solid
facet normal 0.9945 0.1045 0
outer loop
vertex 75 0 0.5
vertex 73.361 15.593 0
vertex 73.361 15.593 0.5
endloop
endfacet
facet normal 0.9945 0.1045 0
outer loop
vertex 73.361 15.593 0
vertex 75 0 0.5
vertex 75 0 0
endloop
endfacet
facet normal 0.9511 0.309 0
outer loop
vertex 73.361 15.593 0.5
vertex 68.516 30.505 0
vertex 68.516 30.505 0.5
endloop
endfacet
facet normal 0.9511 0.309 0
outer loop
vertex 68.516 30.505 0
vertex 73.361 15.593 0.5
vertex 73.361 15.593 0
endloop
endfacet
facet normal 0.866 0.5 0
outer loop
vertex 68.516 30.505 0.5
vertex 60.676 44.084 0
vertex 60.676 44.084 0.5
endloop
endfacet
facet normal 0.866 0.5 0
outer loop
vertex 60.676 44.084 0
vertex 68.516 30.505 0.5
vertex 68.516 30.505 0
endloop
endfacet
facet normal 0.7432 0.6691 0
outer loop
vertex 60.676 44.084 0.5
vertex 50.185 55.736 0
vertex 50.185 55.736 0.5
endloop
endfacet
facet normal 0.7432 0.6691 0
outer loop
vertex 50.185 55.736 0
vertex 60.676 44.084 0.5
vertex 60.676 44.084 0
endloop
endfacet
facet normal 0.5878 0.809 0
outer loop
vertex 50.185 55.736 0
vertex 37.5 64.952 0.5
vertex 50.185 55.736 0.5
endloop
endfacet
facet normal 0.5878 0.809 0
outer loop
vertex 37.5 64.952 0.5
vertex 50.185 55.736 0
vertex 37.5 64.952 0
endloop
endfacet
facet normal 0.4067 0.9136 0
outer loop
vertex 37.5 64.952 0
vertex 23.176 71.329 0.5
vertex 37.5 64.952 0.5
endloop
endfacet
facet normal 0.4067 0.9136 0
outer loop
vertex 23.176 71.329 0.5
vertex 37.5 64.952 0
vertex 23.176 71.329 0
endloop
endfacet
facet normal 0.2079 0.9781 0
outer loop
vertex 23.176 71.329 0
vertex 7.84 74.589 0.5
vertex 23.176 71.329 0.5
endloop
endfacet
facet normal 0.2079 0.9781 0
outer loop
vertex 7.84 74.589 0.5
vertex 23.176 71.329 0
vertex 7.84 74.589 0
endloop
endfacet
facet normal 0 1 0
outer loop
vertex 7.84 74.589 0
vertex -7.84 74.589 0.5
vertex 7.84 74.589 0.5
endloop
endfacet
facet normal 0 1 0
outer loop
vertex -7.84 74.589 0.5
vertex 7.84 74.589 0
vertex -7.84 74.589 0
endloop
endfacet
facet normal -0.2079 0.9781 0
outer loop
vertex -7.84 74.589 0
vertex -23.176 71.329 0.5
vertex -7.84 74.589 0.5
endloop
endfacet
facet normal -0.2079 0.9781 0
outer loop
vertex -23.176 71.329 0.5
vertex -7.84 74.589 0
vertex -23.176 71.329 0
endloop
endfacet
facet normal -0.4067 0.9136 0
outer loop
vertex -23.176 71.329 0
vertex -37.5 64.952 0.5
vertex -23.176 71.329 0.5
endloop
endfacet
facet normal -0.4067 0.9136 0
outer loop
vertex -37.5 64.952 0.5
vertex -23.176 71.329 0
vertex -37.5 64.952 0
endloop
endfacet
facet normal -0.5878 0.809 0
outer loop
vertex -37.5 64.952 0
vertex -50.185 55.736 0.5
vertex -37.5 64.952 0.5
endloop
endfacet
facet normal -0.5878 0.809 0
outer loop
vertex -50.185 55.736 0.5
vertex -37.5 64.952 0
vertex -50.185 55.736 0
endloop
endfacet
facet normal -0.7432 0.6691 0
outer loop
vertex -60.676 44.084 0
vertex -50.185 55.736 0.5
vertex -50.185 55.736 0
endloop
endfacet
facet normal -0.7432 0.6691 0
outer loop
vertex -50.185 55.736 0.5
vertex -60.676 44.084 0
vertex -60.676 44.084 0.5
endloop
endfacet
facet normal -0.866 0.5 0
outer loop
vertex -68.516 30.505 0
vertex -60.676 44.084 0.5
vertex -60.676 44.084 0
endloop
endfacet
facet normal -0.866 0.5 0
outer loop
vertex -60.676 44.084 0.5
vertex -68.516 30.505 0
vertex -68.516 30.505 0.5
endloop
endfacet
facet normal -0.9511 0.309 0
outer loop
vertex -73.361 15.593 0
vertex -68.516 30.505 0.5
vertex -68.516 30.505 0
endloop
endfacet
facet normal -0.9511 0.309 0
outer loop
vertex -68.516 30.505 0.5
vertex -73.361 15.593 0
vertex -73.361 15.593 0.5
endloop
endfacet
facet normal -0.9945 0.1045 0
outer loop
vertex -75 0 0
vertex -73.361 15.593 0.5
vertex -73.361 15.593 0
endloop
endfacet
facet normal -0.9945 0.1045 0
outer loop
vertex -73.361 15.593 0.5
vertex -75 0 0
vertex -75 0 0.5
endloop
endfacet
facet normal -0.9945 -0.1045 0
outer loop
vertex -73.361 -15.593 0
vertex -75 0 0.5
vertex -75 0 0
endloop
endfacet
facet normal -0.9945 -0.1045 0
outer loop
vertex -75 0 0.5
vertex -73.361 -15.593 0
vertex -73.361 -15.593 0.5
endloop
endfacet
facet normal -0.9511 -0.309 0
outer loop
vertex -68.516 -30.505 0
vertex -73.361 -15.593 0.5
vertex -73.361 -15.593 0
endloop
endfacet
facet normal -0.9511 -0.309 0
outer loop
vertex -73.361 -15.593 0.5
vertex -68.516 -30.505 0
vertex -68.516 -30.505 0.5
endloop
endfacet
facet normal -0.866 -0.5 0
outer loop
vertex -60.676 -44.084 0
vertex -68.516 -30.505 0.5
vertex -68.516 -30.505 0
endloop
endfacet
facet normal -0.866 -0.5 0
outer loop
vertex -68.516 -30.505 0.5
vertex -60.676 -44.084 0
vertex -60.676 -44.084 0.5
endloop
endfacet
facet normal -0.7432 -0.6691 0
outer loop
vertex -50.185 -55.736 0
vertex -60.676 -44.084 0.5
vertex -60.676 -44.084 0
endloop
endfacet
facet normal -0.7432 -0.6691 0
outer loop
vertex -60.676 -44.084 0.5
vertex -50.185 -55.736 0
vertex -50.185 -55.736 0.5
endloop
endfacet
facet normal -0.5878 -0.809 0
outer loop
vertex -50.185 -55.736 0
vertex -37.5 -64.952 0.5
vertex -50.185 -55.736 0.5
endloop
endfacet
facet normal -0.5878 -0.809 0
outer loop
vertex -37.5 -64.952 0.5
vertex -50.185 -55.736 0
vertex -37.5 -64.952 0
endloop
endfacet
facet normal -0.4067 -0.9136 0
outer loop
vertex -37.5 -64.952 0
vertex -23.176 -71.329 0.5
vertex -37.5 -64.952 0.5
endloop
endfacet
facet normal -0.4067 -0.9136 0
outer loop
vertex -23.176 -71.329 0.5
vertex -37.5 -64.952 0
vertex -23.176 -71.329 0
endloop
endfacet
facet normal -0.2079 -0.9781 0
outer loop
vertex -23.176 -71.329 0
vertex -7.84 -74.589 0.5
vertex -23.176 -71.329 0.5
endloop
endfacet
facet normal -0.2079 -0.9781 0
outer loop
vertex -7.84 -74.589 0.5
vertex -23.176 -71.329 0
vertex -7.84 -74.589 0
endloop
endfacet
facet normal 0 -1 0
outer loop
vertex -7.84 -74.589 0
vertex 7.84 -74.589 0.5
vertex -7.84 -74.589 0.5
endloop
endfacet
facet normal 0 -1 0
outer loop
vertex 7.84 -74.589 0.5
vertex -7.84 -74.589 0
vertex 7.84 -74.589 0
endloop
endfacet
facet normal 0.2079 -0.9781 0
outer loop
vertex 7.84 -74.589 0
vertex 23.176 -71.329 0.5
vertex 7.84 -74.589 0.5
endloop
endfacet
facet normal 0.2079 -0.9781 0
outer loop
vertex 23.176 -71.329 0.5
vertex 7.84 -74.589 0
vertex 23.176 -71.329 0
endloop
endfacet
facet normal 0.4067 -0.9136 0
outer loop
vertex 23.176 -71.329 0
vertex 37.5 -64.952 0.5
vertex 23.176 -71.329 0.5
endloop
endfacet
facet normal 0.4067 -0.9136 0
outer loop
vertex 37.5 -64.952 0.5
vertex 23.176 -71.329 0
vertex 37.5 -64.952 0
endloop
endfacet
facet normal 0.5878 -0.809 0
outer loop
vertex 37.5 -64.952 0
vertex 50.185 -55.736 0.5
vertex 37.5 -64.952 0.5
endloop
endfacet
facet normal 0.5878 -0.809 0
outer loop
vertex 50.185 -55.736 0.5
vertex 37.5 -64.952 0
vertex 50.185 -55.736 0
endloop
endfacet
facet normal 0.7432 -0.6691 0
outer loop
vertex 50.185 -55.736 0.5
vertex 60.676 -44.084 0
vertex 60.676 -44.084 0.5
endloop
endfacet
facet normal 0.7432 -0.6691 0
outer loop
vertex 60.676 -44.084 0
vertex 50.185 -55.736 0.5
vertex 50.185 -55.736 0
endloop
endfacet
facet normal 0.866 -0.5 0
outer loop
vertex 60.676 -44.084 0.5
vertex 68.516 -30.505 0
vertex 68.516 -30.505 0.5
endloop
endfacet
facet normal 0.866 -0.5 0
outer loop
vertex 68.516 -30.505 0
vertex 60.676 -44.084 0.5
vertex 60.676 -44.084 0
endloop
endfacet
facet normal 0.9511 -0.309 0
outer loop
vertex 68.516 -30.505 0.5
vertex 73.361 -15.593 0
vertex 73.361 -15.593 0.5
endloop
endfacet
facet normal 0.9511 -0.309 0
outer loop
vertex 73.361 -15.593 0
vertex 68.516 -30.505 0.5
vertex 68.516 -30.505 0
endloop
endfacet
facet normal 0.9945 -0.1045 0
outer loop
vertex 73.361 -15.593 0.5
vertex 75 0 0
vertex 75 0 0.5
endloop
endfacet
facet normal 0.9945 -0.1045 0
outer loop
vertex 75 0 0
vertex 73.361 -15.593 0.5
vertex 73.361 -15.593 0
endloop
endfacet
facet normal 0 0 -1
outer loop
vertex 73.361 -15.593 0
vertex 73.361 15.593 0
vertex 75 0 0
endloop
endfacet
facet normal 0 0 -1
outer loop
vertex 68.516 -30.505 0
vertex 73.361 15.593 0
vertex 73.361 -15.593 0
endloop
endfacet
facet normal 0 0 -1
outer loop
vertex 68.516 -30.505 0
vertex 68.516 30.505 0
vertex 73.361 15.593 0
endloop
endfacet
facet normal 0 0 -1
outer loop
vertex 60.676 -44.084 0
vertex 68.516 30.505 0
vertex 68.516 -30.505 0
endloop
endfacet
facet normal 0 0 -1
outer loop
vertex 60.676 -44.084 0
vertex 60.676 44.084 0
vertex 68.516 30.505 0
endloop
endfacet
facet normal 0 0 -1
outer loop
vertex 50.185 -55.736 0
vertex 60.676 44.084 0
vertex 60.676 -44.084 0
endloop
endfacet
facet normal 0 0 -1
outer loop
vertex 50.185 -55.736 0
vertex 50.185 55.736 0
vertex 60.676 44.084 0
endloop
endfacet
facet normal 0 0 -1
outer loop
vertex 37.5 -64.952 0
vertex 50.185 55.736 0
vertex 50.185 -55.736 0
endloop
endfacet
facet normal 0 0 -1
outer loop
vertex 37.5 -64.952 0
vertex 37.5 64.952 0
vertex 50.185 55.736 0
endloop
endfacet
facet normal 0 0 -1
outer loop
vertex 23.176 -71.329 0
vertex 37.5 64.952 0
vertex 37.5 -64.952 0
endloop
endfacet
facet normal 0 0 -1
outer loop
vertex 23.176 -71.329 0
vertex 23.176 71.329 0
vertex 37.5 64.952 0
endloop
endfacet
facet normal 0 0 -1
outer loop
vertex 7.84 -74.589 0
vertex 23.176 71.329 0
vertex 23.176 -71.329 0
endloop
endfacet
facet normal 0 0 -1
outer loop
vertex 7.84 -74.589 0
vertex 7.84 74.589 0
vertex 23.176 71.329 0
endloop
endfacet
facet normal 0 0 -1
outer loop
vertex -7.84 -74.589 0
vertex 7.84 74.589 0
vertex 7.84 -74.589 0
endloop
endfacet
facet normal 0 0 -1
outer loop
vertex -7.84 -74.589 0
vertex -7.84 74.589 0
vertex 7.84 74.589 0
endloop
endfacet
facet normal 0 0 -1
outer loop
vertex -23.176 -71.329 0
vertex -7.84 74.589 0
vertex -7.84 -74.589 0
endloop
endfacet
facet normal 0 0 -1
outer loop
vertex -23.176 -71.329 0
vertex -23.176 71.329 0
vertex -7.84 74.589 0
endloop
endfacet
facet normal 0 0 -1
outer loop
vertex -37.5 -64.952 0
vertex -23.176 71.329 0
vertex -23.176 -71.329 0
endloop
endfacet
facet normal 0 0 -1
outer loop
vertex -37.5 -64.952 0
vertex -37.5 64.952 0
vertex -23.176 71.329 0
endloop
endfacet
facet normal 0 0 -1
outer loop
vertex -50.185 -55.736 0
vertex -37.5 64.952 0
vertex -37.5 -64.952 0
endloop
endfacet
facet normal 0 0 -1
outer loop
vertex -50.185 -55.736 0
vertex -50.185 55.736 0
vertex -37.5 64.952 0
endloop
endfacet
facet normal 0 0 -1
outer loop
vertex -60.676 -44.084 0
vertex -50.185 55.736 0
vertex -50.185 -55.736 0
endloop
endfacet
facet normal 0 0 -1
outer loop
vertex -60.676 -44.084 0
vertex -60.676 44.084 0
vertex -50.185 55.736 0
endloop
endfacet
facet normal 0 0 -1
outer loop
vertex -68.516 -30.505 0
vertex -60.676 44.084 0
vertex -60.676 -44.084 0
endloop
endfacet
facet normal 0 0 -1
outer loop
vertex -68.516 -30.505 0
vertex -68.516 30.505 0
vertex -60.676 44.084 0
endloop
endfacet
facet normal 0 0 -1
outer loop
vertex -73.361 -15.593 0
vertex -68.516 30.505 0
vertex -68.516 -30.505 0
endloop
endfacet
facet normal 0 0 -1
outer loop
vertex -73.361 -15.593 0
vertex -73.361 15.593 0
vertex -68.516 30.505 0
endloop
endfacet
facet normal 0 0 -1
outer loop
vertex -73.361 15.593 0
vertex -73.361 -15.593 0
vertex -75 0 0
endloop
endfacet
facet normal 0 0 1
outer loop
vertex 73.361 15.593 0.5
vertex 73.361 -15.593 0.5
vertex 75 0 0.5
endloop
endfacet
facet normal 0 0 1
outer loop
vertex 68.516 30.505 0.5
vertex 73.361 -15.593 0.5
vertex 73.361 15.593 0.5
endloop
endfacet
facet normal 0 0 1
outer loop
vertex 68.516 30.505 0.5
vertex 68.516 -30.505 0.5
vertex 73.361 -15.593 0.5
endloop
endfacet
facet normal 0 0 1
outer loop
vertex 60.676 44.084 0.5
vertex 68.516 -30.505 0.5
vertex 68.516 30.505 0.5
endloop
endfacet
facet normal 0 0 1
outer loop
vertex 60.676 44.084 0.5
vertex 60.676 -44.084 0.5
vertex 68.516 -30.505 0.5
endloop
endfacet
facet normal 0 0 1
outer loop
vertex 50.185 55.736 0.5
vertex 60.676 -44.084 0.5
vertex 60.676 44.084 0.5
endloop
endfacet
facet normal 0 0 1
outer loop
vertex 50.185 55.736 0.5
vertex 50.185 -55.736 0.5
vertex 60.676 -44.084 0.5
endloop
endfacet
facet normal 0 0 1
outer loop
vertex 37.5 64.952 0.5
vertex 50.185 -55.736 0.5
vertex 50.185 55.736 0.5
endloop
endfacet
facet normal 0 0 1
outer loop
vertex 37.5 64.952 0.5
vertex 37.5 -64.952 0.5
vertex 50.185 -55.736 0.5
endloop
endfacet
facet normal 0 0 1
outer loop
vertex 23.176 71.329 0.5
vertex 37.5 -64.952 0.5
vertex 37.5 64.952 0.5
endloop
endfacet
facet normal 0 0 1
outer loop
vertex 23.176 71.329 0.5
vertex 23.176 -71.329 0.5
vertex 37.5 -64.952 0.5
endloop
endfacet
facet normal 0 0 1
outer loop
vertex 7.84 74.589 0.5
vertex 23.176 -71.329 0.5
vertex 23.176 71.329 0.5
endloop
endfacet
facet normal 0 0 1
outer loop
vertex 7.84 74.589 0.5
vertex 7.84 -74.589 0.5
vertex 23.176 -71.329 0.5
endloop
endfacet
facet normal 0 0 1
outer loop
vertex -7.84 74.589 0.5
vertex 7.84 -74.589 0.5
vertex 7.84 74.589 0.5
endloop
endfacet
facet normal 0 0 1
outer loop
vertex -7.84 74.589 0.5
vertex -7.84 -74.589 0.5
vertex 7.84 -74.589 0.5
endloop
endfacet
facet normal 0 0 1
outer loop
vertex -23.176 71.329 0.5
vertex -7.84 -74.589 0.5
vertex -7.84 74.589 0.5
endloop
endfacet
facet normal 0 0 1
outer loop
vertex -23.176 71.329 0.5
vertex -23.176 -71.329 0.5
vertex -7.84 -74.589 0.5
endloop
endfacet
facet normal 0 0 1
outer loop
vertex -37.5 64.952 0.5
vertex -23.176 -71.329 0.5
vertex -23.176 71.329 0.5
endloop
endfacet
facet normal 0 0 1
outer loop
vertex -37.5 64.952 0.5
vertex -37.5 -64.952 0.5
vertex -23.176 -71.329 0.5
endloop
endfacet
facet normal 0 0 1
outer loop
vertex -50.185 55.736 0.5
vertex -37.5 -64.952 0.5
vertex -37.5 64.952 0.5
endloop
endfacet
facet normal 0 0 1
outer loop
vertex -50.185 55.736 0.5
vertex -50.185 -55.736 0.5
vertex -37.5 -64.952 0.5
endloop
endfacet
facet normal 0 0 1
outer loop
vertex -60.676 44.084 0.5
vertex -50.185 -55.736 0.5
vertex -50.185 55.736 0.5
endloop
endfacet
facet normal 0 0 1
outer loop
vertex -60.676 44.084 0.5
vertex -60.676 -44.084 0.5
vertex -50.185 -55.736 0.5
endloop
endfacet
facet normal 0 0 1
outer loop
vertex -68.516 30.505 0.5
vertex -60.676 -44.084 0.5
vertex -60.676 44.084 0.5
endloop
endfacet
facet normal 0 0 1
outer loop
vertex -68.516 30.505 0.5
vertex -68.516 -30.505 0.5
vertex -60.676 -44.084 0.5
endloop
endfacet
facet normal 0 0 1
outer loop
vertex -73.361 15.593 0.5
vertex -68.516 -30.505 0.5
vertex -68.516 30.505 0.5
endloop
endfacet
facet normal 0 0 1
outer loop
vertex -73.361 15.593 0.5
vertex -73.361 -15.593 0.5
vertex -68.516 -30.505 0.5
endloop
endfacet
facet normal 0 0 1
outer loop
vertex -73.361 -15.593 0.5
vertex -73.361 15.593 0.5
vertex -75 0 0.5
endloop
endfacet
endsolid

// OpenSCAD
height = 0.5;
width = 150;


//cube([width, width, height]);

cylinder(d = width, h = height);
